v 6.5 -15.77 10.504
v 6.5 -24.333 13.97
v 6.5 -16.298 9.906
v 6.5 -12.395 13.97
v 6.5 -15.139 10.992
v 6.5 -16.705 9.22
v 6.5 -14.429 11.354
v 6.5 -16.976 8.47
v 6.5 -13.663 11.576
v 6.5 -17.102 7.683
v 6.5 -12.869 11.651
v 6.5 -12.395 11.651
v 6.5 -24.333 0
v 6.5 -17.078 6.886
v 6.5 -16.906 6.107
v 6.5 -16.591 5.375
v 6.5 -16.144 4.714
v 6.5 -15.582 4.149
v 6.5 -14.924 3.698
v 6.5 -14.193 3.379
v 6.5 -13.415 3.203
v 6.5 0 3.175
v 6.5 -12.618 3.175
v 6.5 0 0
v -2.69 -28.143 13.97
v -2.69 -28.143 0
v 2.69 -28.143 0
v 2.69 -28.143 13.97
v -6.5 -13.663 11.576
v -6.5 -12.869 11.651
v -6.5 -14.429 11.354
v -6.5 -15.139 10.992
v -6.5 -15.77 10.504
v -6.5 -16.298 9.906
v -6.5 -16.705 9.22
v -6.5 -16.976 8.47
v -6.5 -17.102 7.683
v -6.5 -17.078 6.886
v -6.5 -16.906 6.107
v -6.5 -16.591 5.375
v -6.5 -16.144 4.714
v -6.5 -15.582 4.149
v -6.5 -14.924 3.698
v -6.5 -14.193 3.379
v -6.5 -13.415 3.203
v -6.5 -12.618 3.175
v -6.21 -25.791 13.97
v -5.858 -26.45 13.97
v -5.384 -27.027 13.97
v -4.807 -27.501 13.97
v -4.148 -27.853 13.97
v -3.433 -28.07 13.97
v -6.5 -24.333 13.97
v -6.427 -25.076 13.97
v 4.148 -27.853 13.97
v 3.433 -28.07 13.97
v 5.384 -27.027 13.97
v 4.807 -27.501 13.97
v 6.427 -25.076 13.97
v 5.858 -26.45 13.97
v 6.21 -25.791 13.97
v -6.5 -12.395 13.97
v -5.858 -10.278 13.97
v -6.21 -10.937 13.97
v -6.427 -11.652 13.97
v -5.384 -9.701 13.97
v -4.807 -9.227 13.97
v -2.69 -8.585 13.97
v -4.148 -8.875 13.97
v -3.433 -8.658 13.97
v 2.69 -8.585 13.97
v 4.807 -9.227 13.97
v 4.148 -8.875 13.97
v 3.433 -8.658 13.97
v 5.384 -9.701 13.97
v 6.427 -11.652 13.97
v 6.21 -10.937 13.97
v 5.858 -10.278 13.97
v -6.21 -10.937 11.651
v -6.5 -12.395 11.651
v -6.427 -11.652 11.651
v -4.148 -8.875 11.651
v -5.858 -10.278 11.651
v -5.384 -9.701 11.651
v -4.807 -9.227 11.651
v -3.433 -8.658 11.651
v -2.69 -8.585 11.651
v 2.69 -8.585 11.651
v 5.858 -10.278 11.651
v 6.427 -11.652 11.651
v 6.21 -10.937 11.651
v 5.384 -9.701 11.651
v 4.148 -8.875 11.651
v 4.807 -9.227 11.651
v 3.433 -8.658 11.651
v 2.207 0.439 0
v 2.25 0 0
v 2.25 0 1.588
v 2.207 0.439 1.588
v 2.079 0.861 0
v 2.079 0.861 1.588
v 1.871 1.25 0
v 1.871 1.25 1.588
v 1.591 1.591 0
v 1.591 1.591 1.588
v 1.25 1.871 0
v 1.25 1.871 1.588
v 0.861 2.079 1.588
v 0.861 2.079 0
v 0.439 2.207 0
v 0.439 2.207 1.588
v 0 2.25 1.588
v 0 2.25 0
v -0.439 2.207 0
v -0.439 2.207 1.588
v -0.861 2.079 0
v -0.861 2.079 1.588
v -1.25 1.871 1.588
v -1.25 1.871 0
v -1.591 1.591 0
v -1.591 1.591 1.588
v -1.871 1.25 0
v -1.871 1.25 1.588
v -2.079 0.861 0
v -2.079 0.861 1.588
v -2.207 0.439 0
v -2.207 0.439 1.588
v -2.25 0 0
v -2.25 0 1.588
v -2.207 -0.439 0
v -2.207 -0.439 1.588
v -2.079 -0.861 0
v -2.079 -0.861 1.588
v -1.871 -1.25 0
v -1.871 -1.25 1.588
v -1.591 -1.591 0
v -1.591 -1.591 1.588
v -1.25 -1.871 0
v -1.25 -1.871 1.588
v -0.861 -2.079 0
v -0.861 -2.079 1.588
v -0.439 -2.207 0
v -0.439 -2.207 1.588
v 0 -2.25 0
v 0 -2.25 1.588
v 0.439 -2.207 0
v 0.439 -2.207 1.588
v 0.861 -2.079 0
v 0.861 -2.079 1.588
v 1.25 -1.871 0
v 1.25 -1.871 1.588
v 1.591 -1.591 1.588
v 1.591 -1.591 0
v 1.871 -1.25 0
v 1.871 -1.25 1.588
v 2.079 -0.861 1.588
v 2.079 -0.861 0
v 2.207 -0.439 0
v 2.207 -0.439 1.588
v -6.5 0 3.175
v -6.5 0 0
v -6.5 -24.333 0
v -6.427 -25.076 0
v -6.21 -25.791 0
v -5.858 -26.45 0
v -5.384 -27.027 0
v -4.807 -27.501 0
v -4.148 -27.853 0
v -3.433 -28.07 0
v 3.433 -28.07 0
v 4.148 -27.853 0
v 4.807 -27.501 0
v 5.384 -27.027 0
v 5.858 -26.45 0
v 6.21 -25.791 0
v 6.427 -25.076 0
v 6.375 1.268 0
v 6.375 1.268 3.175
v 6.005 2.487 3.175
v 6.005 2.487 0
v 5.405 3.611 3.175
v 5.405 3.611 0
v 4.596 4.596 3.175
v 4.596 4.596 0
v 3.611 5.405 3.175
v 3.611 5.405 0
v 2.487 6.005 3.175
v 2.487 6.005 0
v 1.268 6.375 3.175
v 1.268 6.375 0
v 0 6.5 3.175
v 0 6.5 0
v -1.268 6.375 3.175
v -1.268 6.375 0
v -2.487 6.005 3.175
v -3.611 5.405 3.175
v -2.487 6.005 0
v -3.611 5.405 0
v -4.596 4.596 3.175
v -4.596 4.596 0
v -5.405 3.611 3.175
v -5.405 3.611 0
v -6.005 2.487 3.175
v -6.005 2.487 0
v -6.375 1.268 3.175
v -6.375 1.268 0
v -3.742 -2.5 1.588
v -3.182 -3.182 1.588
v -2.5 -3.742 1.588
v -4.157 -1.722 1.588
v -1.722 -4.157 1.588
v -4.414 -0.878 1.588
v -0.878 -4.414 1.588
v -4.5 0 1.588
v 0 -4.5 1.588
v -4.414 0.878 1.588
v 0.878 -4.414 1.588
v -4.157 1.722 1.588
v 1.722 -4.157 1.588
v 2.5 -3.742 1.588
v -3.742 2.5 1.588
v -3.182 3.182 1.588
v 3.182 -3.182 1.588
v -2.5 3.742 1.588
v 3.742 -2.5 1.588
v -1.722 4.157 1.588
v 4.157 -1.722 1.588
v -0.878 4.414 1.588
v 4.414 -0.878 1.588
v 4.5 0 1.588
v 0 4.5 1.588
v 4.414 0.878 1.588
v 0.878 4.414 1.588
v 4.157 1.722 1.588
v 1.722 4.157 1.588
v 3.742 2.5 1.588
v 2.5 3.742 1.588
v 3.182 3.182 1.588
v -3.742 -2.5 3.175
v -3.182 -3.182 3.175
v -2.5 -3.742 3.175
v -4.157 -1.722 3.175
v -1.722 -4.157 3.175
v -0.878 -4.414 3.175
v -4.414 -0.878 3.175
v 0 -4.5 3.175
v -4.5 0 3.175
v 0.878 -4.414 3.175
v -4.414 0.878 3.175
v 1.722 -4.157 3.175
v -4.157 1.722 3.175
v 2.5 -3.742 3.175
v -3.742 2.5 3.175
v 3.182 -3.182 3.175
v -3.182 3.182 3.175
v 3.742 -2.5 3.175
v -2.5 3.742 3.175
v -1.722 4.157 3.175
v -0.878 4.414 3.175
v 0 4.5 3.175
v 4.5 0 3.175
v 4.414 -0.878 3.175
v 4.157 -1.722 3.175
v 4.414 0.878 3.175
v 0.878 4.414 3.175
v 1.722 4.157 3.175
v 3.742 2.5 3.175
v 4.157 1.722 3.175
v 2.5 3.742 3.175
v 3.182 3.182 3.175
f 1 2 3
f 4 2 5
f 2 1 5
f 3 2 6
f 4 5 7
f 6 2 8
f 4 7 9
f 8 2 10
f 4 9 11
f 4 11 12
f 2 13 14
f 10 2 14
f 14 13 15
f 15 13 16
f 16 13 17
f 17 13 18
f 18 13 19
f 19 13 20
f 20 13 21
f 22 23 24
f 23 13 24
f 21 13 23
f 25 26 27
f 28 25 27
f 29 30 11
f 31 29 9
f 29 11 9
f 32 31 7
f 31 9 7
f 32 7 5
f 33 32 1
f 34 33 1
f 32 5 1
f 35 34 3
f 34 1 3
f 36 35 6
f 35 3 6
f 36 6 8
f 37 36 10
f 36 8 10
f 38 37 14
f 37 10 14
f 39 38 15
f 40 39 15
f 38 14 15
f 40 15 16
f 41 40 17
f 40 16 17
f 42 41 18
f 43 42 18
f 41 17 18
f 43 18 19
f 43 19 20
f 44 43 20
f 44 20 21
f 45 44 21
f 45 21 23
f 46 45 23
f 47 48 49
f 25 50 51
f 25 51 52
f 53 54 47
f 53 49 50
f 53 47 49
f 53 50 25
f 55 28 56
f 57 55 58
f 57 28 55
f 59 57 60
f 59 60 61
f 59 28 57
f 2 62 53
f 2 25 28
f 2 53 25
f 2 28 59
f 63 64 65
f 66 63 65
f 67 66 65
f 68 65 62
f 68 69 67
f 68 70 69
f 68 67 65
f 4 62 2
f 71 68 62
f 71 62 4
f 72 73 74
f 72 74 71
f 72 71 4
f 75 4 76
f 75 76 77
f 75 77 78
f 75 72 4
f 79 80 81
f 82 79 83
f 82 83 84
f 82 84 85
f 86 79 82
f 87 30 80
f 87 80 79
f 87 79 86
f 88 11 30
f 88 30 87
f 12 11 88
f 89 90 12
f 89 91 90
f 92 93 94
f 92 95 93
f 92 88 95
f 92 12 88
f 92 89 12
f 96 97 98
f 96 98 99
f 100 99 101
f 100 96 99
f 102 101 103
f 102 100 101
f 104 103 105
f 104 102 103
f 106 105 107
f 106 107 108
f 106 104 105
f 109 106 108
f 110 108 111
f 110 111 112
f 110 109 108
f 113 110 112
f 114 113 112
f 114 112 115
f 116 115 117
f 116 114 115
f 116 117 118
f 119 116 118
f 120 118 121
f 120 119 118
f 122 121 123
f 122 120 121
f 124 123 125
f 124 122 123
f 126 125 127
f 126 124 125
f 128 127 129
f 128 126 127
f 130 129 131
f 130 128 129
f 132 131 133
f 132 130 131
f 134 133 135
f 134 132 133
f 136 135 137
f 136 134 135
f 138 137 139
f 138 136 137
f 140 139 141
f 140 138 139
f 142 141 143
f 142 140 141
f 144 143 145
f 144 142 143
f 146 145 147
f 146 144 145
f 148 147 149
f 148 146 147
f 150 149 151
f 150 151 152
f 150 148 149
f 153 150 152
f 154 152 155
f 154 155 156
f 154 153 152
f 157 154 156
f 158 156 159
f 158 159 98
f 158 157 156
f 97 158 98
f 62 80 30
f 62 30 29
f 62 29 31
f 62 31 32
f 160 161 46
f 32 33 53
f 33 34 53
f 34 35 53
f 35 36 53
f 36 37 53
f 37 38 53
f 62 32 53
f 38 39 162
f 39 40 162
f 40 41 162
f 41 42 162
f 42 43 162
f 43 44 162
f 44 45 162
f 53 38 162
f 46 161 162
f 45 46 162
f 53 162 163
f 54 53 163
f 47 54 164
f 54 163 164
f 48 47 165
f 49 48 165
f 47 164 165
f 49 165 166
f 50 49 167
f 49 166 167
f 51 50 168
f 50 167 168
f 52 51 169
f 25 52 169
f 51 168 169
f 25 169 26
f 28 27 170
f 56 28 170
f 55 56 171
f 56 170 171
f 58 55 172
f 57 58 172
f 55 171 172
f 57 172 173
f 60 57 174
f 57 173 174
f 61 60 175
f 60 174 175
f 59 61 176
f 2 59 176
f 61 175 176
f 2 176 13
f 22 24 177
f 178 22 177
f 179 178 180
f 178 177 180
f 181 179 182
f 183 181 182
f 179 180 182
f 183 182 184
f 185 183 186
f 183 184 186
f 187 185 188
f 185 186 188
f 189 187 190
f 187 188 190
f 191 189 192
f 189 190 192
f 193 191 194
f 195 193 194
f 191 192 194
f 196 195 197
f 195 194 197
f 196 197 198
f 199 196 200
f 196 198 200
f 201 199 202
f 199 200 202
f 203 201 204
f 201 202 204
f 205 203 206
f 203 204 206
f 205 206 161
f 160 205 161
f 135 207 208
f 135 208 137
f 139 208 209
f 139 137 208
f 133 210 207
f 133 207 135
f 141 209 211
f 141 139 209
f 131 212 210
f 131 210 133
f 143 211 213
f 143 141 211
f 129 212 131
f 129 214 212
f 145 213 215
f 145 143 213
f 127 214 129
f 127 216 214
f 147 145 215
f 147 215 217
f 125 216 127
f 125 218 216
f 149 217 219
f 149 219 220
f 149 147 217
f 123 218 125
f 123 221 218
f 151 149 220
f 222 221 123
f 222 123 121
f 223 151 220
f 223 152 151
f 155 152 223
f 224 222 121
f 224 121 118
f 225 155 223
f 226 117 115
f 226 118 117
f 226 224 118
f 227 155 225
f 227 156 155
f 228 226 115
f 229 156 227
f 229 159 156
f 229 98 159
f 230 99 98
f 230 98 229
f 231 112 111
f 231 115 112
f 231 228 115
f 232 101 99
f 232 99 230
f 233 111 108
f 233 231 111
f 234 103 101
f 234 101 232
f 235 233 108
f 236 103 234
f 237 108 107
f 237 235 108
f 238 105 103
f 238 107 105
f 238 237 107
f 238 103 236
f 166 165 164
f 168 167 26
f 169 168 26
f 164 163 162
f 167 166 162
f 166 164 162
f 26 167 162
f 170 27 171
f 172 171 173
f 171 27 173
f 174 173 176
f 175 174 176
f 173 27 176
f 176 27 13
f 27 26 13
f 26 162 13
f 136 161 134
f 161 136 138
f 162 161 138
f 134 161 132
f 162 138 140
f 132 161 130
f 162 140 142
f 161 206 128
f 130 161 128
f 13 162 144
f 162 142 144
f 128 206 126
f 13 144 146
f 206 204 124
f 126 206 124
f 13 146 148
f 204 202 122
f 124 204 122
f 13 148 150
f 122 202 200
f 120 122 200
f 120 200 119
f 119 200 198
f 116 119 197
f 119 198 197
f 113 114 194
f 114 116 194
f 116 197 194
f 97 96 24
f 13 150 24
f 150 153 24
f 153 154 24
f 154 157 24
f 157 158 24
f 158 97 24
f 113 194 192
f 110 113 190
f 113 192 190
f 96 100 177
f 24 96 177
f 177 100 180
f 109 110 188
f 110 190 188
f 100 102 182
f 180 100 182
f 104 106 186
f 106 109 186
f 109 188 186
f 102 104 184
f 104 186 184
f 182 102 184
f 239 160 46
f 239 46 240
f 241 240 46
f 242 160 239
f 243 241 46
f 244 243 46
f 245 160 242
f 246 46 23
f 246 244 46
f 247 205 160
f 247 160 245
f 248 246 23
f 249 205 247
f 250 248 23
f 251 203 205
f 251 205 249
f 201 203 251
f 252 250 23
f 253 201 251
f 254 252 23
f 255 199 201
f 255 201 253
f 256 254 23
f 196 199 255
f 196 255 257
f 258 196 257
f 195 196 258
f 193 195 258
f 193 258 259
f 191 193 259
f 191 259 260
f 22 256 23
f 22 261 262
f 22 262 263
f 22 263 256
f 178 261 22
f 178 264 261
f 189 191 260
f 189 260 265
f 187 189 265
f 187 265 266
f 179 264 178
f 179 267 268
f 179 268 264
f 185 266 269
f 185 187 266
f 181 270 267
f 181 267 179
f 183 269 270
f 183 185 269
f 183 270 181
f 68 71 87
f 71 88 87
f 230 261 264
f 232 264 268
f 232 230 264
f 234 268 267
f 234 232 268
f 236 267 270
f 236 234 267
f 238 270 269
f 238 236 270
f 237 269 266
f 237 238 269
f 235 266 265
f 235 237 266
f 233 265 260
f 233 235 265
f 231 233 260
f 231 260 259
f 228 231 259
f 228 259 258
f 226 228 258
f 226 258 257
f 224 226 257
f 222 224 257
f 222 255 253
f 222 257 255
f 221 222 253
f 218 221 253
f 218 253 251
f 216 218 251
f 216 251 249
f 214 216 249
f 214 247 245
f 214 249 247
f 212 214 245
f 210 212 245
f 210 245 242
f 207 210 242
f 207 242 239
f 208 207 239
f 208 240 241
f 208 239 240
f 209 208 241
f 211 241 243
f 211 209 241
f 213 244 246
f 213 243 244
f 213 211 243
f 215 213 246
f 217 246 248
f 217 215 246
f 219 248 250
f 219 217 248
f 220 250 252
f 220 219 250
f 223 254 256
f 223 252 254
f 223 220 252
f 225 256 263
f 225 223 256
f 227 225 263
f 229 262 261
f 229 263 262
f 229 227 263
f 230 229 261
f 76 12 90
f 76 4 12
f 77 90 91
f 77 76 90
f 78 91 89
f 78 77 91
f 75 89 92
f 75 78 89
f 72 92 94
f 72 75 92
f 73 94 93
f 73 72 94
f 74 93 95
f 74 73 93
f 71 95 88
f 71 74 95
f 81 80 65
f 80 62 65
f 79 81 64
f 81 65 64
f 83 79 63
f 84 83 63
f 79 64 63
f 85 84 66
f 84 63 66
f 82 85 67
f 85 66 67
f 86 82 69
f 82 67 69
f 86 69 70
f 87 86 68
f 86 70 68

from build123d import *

# Parameters (mm, degrees)
F0_R     = 4.5
F1_DEPTH = 3.175
F0_R_2   = 2.25
F2_DEPTH = 1.5875
F3_DEPTH = 13.97
F4_W     = 8.5852
F4_H     = 8.4761770735
F5_DEPTH = 25.4
F6_R     = 3.81


with BuildPart() as f1:
    # F0 (on Top) → F1 (new body)
    with BuildSketch(Plane.XY):
        with BuildLine():
            Line((6.5, -8.5852), (6.5, 0))
            ThreePointArc((6.5, 0), (0, -6.5), (-6.5, 0))
            Line((-6.5, 0), (-6.5, -8.5852))
            Line((-6.5, -8.5852), (6.5, -8.5852))
        make_face()
        with BuildLine():
            ThreePointArc((-6.5, 0), (0, -6.5), (6.5, 0))
            ThreePointArc((6.5, 0), (0, 6.5), (-6.5, 0))
        make_face()
        Circle(F0_R, mode=Mode.SUBTRACT)
    extrude(amount=F1_DEPTH)

    # F0 (on Top) → F2 (join)
    with BuildSketch(Plane.XY):
        Circle(F0_R)
        Circle(F0_R_2, mode=Mode.SUBTRACT)
    extrude(amount=F2_DEPTH)

    # F0 (on Top) → F3 (join)
    with BuildSketch(Plane.XY):
        with BuildLine():
            Line((6.5, -24.3332), (6.5, -8.5852))
            Line((6.5, -8.5852), (-6.5, -8.5852))
            Line((-6.5, -8.5852), (-6.5, -24.3332))
            ThreePointArc((-6.5, -24.3332), (-5.3840768363, -27.0272768363), (-2.69, -28.1432))
            Line((-2.69, -28.1432), (2.69, -28.1432))
            ThreePointArc((2.69, -28.1432), (5.3840768363, -27.0272768363), (6.5, -24.3332))
        make_face()
    extrude(amount=F3_DEPTH)

    # F4 (on face) → F5 (cut)
    with BuildSketch(Plane.YZ.offset(6.5)):
        with BuildLine():
            ThreePointArc((-12.6179837447, 3.175), (-9.7820030962, 4.5000062934), (-8.6270184297, 7.4093770735))
            ThreePointArc((-8.6270184297, 7.4093770735), (-9.8694128853, 10.408782618), (-12.8688184297, 11.6511770735))
            Line((-12.8688184297, 11.6511770735), (-12.8688184297, 3.175))
            Line((-12.8688184297, 3.175), (-12.6179837447, 3.175))
        make_face()
        with BuildLine():
            Line((-12.8688184297, 3.175), (-12.8688184297, 11.6511770735))
            ThreePointArc((-12.8688184297, 11.6511770735), (-17.108762292, 7.2839048265), (-12.6179837447, 3.175))
            Line((-12.6179837447, 3.175), (-12.8688184297, 3.175))
        make_face()
        with Locations((-4.2926, 7.4130885368)):
            Rectangle(F4_W, F4_H)
        with BuildLine():
            ThreePointArc((-12.8688184297, 11.6511770735), (-9.8694128853, 10.408782618), (-8.6270184297, 7.4093770735))
            ThreePointArc((-8.6270184297, 7.4093770735), (-9.7820030962, 4.5000062934), (-12.6179837447, 3.175))
            Line((-12.6179837447, 3.175), (-8.5852, 3.175))
            Line((-8.5852, 3.175), (-8.5852, 11.6511770735))
            Line((-8.5852, 11.6511770735), (-12.8688184297, 11.6511770735))
        make_face()
    extrude(amount=-F5_DEPTH, mode=Mode.SUBTRACT)

    # F6
    f6_edges = [f1.edges().sort_by_distance(p)[0] for p in [
        (6.5, -8.5852, 12.810589),
        (-6.5, -8.5852, 12.810589),
    ]]
    fillet(f6_edges, radius=F6_R)


solid = f1.part
